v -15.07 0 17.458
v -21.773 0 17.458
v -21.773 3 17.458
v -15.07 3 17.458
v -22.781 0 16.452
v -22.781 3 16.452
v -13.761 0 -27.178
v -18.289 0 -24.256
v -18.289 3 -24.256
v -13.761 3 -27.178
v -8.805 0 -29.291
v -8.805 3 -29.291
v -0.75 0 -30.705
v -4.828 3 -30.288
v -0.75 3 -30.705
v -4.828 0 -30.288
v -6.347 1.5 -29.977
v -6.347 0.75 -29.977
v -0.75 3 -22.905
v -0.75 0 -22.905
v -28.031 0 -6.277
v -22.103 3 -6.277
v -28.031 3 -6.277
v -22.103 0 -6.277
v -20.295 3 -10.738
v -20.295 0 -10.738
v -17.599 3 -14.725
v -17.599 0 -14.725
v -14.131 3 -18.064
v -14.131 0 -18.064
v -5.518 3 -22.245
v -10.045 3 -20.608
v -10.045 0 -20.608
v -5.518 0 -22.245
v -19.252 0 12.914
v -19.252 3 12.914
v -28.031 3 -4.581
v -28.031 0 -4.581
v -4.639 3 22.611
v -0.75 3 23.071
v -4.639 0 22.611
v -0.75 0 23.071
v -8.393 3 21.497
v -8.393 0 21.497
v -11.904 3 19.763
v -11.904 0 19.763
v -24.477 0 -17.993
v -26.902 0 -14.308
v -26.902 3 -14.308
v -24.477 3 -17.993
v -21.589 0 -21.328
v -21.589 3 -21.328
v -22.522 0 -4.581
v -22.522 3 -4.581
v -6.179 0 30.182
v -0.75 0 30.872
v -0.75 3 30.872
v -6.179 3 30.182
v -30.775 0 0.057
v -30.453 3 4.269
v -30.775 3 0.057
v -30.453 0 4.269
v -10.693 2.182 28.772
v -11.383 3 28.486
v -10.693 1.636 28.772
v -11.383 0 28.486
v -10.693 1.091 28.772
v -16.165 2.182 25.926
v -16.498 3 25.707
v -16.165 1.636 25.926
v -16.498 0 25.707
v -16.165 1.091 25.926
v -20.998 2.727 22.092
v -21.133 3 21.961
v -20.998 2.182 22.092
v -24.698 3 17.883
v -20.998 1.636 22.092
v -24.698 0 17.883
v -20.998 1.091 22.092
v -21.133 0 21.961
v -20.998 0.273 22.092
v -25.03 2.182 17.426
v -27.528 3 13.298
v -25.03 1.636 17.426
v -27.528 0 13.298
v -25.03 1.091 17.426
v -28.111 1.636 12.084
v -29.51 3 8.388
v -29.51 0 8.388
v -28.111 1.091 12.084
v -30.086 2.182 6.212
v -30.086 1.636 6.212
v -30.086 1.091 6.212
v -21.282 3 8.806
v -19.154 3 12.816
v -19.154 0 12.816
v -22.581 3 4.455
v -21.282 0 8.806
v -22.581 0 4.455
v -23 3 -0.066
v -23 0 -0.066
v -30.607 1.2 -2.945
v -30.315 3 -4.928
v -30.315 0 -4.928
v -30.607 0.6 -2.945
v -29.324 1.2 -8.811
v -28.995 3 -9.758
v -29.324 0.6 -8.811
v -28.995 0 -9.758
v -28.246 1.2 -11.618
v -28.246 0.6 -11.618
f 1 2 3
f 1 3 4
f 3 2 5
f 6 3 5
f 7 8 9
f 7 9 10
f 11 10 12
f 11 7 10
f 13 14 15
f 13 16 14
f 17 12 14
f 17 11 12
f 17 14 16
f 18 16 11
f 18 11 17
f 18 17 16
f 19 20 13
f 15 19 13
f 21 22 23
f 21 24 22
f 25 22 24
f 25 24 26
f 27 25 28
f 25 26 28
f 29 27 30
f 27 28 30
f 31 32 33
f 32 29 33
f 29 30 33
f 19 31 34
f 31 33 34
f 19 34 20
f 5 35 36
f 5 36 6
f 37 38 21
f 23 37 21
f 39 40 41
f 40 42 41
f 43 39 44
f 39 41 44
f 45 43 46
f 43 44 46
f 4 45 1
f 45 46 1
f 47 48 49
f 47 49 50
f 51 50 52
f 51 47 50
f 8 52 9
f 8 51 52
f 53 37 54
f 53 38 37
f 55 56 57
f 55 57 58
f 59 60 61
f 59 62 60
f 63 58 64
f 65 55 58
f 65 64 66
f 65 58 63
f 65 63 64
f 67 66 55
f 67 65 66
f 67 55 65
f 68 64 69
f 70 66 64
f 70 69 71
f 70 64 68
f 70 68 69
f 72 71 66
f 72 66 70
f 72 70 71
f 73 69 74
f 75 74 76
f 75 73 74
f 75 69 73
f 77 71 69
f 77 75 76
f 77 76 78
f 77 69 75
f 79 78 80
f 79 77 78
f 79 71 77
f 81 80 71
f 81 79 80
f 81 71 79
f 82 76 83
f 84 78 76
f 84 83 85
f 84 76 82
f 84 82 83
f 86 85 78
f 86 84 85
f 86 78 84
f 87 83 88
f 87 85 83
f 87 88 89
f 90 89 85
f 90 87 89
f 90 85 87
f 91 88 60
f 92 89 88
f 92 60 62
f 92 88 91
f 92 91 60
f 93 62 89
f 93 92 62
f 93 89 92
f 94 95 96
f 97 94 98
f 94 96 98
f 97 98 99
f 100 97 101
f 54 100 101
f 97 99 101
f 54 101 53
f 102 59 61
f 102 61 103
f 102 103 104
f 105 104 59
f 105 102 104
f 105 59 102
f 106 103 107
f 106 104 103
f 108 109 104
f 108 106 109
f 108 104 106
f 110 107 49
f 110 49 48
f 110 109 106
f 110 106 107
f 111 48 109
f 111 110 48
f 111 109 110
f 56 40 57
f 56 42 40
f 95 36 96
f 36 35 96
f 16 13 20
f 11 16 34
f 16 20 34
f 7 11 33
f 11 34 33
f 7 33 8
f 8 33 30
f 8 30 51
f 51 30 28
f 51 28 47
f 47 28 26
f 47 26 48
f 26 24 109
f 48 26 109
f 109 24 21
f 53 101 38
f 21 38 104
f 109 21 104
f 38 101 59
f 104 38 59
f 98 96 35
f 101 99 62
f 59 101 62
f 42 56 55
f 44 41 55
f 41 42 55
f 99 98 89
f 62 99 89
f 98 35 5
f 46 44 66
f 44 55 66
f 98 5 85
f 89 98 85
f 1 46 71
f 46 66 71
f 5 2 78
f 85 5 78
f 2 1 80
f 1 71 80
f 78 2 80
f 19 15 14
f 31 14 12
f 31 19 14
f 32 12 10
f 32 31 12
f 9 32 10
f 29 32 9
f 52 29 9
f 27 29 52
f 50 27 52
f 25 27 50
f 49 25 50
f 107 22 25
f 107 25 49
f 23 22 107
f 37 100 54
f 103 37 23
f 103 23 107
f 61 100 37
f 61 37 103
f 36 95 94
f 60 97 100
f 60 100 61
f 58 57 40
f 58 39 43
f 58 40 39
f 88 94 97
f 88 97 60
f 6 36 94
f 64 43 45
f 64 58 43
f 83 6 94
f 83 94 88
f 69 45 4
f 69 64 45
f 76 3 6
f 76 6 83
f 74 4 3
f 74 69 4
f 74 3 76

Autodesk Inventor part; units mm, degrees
ref_plane "YZ Plane" through (0, 0, 0) normal (1, 0, 0) x (0, 1, 0)
ref_plane "XZ Plane" through (0, 0, 0) normal (0, 1, 0) x (-1, 0, 0)
ref_plane "XY Plane" through (0, 0, 0) normal (0, 0, 1) x (1, 0, 0)
sketch "Sketch1" plane through (0, 0, 0) normal (0, 1, 0) x (-1, 0, 0)
  line L0 (-40, -22.2559) -> (-17.5965, -22.2559) projected
  spline S0 degree 3 poles (-17.5965, -22.2559) (-16.6656, -23.0054) (-15.6914, -23.7008) (-11.4898, -26.3394) (-7.9349, -27.7425) (-1.802, -28.767) (1.7129, -29.0153) (9.4587, -27.1875) (12.7711, -25.6792) (16.3694, -23.2064) (16.9921, -22.7425) (17.5965, -22.2559) knots 1.921938 1.921938 1.921938 1.921938 2.28002 2.28002 3.408568 3.408568 4.146561 4.146561 4.751486 4.751486 4.882227 4.882227 4.882227 4.882227 projected
  line L1 (17.5965, -22.2559) -> (40, -22.2559) projected
  line L2 (40, -22.2559) -> (40, -16.3077) projected
  line L3 (40, -16.3077) -> (23.2525, -16.3077) projected
  spline S1 degree 3 poles (23.2525, -16.3077) (24.6957, -14.3166) (25.8988, -12.1536) (28.0747, -6.71) (28.7719, -3.3404) (28.7749, 0.0586) knots 0.307224 0.307224 0.307224 0.307224 1.04533 1.04533 2.067491 2.067491 2.067491 2.067491 projected
  spline S2 degree 3 poles (28.7749, 0.0586) (28.7778, 3.3432) (28.1322, 6.6023) (25.6023, 13.1892) (23.5632, 16.432) (18.302, 22.1753) (15.0141, 24.6102) (8.1089, 27.8149) (4.5799, 28.7211) (-2.7873, 29.0129) (-6.0815, 28.2969) (-12.2596, 26.1389) (-15.5213, 24.2237) (-21.3931, 19.1817) (-23.9297, 15.9754) (-27.394, 9.1373) (-28.4362, 5.5845) (-28.8291, 0.2785) (-28.786, -1.3758) (-28.2317, -5.891) (-27.4068, -8.6862) (-25.3769, -13.0646) (-24.3891, -14.7396) (-23.2525, -16.3077) knots 0 0 0 0 0.985401 0.985401 2.113862 2.113862 3.316195 3.316195 4.394104 4.394104 5.528611 5.528611 7.023718 7.023718 8.634698 8.634698 10.102311 10.102311 10.775364 10.775364 11.944404 11.944404 12.727759 12.727759 12.727759 12.727759 projected
  line L4 (-23.2525, -16.3077) -> (-40, -16.3077) projected
  line L5 (-40, -16.3077) -> (-40, -22.2559) projected
  circle A0 centre (0, 0.0832) radius 23 projected
  line L6 (0.75, 28.2736) -> (0.75, 23.0832) projected
  line L7 (19.2521, 12.9144) -> (23.1341, 16.806) projected
  line L8 (22.3297, -4.6807) -> (27.9307, -4.6807) projected
  line L9 (27.9307, -6.177) -> (22.3297, -6.177) projected
  line L10 (0.75, -22.9168) -> (0.75, -28.7163) projected
  line L11 (19.2521, 12.9144) -> (19.1539, 12.8161)
  line L12 (26.9025, -14.3077) -> (42, -14.3077)
  line L13 (42, -14.3077) -> (42, -24.2559)
  line L14 (42, -24.2559) -> (18.2892, -24.2559)
  line L15 (-18.2892, -24.2559) -> (-42, -24.2559)
  line L16 (-42, -24.2559) -> (-42, -14.3077)
  line L17 (-42, -14.3077) -> (-26.9025, -14.3077)
  line L18 (22.3035, 16.9291) -> (22.8338, 16.4001) projected
  line L19 (22.3035, 16.9291) -> (21.7732, 17.4581) projected
  line L20 (21.7732, 17.4581) -> (15.0702, 17.4581)
  line L21 (0.75, 28.2736) -> (0.75, 30.8725)
  line L22 (22.3297, -6.177) -> (22.1316, -6.177)
  line L23 (27.9307, -5.4288) -> (27.9307, -4.6807) projected
  line L24 (27.9307, -5.4288) -> (27.9307, -6.177) projected
  line L25 (22.1031, -6.277) -> (27.9768, -6.277)
  line L26 (28.0307, -4.5807) -> (28.0307, -6.277)
  line L27 (28.0307, -6.277) -> (27.9768, -6.277)
  line L28 (28.0307, -4.5807) -> (22.5222, -4.5807)
  arc A1 (18.2892, -24.2559) -> (26.9025, -14.3077) centre (-2.2893, 2.264) ccw
  line L29 (0.75, -28.7163) -> (0.75, -30.7052)
  line L30 (0.75, 23.0832) -> (0.75, 23.071)
  line L31 (0.75, -22.9168) -> (0.75, -22.9046)
  spline S3 degree 5 poles (-26.9025, -14.3077) (-27.429, -13.3679) (-27.9159, -12.406) (-28.3615, -11.4239) (-29.4514, -8.7146) (-30.2109, -5.8891) (-30.5495, -4.0723) (-30.9282, -0.387) (-30.677, 3.3095) (-30.3948, 5.1476) (-29.5444, 8.755) (-28.1523, 12.1901) (-27.3327, 13.8493) (-25.462, 17.0353) (-23.1617, 19.9263) (-21.9138, 21.288) (-19.2364, 23.8311) (-16.2309, 25.977) (-14.6542, 26.9424) (-11.1856, 28.736) (-7.4774, 29.9652) (-5.4735, 30.4505) (-0.9788, 31.1008) (3.5628, 30.8183) (6.0146, 30.3783) (10.7855, 29.0025) (15.1886, 26.7031) (17.271, 25.3465) (21.1567, 22.2584) (24.4033, 18.5051) (25.8467, 16.4825) (28.3392, 12.1746) (29.9378, 7.461) (30.4933, 5.0225) (30.7772, 2.5393) (30.7749, 0.0568) knots 0 0 0 0 0 0 0.04843 0.04843 0.04843 0.131166 0.131166 0.131166 0.214396 0.214396 0.214396 0.297313 0.297313 0.297313 0.380087 0.380087 0.380087 0.462936 0.462936 0.462936 0.55515 0.55515 0.55515 0.666218 0.666218 0.666218 0.77732 0.77732 0.77732 0.888384 0.888384 0.888384 1 1 1 1 1 1
  spline S4 degree 5 poles (30.7749, 0.0568) (30.7726, -2.951) (30.349, -5.9587) (29.5343, -8.8867) (28.3726, -11.6837) (26.9025, -14.3077) knots 0 0 0 0 0 0 1 1 1 1 1 1
  spline S5 degree 5 poles (18.2892, -24.2559) (16.1748, -25.8838) (13.8947, -27.2963) (11.4761, -28.469) (6.8505, -30.1183) (1.9949, -30.776) (-0.231, -30.8531) (-4.0328, -30.578) (-7.7292, -29.6857) (-9.2444, -29.2094) (-12.0661, -28.1171) (-14.7351, -26.6935) (-15.965, -25.9461) (-17.1511, -25.1321) (-18.2892, -24.2559) knots 0 0 0 0 0 0 0.337839 0.337839 0.337839 0.617671 0.617671 0.617671 0.818155 0.818155 0.818155 1 1 1 1 1 1
  point P0 (0, 0)
  point P1 (22.7814, 16.4524)
  dimension "d0" = 2
  dimension "d1" = 0.1
  dimension "d2" = 0.1
  dimension "d3" = 0.1
extrude "Extrusion1" add sketch "Sketch1" along normal blind 3 contours L10 L31 A0 L25 S1 L3 A1 L1 S0 | S0 L1 A1 S5 L29 L10 | L21 S3 S4 A1 L3 S1 L27 L26 S2 | S2 L7 L18 L19 L20 A0 L30 L6 L21 | S2 S1 L26 L28 A0 L11 L7
equation "\"d2\" = slack"
equation "\"d3\" = slack"
equation "\"slack\" = 0.1"
properties part number "Back_back_aligner"
